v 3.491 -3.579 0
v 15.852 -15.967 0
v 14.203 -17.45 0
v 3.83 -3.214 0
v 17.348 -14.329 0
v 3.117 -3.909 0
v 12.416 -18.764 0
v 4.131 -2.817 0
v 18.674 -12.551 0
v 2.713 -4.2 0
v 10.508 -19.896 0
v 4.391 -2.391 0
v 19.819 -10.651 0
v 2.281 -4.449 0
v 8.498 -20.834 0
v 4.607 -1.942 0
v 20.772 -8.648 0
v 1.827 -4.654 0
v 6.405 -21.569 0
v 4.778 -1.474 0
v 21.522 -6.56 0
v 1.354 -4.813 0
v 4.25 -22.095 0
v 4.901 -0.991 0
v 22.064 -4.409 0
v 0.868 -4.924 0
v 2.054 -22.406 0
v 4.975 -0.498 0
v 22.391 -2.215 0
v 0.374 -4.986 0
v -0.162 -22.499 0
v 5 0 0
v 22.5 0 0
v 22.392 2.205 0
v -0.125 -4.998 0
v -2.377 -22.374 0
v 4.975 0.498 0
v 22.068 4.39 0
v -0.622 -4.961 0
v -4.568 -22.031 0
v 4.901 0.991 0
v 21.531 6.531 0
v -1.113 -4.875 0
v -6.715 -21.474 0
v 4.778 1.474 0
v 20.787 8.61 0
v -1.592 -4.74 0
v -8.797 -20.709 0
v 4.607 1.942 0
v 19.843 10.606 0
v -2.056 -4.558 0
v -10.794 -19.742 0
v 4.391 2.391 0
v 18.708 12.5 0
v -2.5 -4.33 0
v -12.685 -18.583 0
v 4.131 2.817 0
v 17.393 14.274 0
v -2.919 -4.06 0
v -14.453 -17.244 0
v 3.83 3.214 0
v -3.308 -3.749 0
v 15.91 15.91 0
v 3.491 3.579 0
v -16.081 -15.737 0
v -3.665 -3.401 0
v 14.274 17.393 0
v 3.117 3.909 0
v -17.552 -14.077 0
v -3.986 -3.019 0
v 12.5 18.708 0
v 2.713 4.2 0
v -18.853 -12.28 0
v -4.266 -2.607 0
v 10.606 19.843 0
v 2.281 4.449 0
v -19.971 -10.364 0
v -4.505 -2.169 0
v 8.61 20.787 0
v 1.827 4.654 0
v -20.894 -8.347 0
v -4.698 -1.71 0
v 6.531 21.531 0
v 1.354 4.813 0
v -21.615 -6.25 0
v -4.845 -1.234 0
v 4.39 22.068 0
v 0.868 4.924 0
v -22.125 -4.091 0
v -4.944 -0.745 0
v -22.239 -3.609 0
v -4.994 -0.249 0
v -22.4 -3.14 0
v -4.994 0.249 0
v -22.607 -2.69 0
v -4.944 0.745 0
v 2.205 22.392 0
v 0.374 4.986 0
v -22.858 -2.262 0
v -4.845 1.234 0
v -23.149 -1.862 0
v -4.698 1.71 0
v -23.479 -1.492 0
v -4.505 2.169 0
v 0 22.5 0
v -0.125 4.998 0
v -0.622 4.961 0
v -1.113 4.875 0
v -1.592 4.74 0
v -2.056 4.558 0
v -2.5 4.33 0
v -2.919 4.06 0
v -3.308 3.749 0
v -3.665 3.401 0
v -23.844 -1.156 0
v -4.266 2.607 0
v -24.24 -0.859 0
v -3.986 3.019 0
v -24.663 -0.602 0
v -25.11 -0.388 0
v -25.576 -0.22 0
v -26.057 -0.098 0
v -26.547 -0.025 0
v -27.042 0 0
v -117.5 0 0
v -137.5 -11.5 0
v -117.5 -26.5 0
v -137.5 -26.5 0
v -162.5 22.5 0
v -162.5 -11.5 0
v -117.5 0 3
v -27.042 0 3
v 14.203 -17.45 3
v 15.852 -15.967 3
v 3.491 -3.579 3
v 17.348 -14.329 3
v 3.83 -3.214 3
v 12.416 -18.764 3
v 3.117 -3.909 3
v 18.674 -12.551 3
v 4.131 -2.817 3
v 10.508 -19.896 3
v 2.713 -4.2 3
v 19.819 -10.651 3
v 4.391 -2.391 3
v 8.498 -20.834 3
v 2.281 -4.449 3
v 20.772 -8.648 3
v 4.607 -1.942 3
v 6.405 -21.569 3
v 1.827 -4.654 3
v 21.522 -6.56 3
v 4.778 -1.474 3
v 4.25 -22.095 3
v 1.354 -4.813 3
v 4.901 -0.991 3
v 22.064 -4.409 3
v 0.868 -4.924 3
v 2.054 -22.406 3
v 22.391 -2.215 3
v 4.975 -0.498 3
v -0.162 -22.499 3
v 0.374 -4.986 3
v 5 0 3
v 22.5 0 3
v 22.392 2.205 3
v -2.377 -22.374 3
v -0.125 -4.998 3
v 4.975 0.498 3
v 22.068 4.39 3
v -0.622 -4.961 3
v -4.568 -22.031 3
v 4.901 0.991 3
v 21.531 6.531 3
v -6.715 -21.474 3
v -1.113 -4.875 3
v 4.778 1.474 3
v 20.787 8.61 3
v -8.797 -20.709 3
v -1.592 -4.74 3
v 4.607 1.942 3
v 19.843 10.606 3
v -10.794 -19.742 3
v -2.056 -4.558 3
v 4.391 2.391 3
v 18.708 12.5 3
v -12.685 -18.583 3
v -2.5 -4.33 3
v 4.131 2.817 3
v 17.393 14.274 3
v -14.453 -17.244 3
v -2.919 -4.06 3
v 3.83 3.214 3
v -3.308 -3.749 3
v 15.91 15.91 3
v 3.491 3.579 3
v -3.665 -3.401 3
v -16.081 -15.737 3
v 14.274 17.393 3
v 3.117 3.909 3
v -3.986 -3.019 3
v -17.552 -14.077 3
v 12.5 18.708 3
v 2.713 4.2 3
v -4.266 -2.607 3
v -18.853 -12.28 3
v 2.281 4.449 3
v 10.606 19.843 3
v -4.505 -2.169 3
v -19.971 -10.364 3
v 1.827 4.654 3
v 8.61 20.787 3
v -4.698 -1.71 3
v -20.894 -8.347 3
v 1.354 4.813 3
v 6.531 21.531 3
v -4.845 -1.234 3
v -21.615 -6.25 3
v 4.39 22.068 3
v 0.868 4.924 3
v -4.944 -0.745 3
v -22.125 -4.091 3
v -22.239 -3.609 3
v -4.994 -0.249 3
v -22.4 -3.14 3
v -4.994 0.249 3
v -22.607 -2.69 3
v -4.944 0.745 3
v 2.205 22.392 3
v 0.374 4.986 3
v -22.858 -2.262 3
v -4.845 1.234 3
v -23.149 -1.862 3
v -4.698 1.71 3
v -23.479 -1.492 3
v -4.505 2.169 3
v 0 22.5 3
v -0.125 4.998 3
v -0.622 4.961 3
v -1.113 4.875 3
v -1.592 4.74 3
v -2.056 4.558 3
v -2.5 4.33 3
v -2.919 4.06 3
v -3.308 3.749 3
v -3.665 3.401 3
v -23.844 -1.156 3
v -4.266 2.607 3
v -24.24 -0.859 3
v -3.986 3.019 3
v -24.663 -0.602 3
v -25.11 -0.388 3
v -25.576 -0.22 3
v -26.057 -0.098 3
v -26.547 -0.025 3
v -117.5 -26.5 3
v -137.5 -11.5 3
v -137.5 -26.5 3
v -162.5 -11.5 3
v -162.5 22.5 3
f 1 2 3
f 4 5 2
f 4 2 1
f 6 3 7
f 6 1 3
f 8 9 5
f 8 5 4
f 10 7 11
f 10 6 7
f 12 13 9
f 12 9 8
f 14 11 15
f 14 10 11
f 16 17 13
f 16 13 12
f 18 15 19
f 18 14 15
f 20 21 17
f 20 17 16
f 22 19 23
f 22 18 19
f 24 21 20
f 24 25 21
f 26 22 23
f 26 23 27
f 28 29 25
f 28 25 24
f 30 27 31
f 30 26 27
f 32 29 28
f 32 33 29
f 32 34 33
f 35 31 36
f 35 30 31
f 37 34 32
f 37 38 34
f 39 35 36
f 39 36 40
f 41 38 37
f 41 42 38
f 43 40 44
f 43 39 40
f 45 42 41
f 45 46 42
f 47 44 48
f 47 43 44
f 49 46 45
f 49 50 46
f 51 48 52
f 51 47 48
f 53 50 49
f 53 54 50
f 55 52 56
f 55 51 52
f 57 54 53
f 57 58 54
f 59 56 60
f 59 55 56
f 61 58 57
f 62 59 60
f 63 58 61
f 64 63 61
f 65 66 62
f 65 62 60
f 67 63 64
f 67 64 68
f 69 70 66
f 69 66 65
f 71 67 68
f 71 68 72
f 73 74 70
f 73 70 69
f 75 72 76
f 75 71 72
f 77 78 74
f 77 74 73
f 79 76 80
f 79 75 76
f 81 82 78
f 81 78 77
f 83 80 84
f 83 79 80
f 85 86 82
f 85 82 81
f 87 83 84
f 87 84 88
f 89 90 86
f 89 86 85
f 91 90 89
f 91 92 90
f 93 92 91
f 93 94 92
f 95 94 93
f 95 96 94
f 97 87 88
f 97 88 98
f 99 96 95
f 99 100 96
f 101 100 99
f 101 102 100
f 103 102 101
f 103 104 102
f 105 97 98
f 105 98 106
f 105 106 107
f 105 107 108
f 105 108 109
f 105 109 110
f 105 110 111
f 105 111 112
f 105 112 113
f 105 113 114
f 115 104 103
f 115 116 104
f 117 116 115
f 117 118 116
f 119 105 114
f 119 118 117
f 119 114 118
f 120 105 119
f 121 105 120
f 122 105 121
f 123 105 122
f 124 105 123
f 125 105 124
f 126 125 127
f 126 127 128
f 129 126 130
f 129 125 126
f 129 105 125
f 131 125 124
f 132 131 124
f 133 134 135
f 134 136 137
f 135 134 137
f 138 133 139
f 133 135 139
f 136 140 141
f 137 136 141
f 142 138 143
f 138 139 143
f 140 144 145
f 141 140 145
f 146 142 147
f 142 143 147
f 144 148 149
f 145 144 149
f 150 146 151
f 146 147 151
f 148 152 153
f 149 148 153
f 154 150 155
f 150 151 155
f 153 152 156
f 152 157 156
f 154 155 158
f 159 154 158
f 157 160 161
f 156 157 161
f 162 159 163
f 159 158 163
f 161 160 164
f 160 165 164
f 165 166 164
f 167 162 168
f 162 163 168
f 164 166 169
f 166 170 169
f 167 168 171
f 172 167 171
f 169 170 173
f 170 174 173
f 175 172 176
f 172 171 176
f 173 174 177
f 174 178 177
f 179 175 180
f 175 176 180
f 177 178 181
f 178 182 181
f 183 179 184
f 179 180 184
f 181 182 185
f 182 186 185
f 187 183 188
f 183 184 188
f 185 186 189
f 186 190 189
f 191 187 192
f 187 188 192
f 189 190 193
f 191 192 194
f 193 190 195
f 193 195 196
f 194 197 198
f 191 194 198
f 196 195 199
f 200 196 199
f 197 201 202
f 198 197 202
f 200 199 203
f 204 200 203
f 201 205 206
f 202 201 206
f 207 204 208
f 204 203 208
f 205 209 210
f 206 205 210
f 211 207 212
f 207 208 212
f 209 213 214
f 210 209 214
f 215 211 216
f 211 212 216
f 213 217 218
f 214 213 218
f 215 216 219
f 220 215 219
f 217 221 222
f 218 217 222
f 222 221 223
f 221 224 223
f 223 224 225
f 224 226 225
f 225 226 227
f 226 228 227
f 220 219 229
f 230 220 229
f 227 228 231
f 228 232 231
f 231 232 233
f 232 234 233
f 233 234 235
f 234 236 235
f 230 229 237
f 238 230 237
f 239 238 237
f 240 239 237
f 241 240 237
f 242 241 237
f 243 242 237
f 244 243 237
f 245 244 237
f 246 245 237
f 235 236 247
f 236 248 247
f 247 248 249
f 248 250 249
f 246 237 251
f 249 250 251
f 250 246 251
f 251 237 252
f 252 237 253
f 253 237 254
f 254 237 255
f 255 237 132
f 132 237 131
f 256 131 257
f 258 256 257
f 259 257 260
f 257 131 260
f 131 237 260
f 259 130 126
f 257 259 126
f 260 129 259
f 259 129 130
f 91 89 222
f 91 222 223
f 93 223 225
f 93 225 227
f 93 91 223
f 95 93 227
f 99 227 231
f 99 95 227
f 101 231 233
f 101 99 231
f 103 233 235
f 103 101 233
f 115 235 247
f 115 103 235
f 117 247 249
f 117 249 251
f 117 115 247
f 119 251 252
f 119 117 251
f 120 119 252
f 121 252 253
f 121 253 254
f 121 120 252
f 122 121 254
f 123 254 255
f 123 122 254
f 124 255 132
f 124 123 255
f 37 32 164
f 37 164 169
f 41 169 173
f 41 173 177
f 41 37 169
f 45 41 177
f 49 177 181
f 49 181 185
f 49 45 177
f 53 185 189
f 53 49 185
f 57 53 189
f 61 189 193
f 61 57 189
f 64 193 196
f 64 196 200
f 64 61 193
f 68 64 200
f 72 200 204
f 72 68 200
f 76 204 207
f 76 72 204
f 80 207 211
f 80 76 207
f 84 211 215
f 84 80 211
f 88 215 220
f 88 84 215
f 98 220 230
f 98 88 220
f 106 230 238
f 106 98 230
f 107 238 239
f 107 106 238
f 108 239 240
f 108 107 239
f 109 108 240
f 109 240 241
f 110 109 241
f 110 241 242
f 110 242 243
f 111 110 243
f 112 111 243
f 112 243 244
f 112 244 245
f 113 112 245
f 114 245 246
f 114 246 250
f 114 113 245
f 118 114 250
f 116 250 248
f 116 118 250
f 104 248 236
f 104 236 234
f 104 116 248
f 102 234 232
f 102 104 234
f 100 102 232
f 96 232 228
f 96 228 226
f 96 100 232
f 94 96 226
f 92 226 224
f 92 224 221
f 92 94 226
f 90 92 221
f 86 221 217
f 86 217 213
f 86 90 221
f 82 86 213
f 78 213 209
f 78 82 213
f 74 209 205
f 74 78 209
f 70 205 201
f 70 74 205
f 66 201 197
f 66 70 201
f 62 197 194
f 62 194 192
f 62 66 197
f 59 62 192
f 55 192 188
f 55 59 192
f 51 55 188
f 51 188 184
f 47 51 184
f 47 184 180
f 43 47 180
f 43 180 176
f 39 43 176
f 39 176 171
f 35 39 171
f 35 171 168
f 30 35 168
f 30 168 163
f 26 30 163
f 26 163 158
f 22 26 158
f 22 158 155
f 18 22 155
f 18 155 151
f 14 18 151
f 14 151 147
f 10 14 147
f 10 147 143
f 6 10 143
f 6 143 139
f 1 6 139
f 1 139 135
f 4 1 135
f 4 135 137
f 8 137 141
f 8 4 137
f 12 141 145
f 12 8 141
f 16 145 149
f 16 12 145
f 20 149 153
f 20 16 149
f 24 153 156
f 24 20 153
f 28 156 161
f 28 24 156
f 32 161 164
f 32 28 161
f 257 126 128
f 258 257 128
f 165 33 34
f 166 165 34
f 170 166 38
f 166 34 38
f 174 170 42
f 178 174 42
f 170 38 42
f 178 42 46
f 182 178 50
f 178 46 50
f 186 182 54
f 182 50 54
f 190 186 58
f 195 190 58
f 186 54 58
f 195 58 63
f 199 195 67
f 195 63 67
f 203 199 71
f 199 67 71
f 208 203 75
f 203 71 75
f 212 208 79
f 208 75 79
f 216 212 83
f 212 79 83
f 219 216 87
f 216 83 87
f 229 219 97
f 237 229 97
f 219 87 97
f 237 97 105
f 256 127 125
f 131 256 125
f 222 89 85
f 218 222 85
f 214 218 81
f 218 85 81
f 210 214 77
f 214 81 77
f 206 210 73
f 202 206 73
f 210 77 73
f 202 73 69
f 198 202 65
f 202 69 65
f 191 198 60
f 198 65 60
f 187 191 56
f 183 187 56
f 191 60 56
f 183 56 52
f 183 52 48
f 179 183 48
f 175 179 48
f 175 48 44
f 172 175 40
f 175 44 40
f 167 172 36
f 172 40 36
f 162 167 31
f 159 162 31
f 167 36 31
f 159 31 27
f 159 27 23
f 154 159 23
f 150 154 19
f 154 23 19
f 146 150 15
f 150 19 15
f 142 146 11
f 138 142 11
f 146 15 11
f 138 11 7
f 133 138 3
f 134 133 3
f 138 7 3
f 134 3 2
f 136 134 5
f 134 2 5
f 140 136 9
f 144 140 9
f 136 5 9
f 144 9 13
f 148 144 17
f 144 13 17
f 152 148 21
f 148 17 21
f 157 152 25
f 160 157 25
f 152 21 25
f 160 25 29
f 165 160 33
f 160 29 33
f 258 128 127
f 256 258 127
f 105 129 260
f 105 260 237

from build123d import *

# Parameters (mm, degrees)
SKETCH1_R           = 2.5
BOSS_EXTRUDE1_DEPTH = 3
BOSS_EXTRUDE2_START = -3
SKETCH3_R           = 22.5
SKETCH3_R_2         = 5
BOSS_EXTRUDE2_DEPTH = 3


with BuildPart() as part:
    # Sketch1 → Boss-Extrude1 (new body)
    # profile 1 of 8: a face of its own
    with BuildSketch(Plane.XY):
        with BuildLine():
            ThreePointArc((22.5, 0), (15.909902577, 15.909902577), (0, 22.5))
            Line((0, 22.5), (-22.5, 0))
            Line((-22.5, 0), (-22.124973736, -4.090909091))
            ThreePointArc((-22.124973736, -4.090909091), (2.054031517, -22.406047276), (22.5, 0))
        make_face()
        with BuildLine():
            ThreePointArc((-7.5, 5), (-9.267766953, 9.267766953), (-5, 7.5))
            Line((-5, 7.5), (-5, 9))
            Line((-5, 9), (-2.405779746, 18.179870439))
            ThreePointArc((-2.405779746, 18.179870439), (0, 20), (2.405779746, 18.179870439))
            Line((2.405779746, 18.179870439), (5, 9))
            Line((5, 9), (5, 7.5))
            ThreePointArc((5, 7.5), (7.5, 10), (10, 7.5))
            ThreePointArc((10, 7.5), (9.267766953, 5.732233047), (7.5, 5))
            Line((7.5, 5), (9, 5))
            Line((9, 5), (18.179870439, 2.405779746))
            ThreePointArc((18.179870439, 2.405779746), (19.493699588, 1.508363998), (20, 0))
            ThreePointArc((20, 0), (19.493699588, -1.508363998), (18.179870439, -2.405779746))
            Line((18.179870439, -2.405779746), (9, -5))
            Line((9, -5), (7.5, -5))
            ThreePointArc((7.5, -5), (9.267766953, -5.732233047), (10, -7.5))
            ThreePointArc((10, -7.5), (7.5, -10), (5, -7.5))
            Line((5, -7.5), (5, -9))
            Line((5, -9), (2.405779746, -18.179870439))
            ThreePointArc((2.405779746, -18.179870439), (0, -20), (-2.405779746, -18.179870439))
            Line((-2.405779746, -18.179870439), (-5, -9))
            Line((-5, -9), (-5, -7.5))
            ThreePointArc((-5, -7.5), (-9.267766953, -9.267766953), (-7.5, -5))
            Line((-7.5, -5), (-9, -5))
            Line((-9, -5), (-18.179870439, -2.405779746))
            ThreePointArc((-18.179870439, -2.405779746), (-20, 0), (-18.179870439, 2.405779746))
            Line((-18.179870439, 2.405779746), (-9, 5))
            Line((-9, 5), (-7.5, 5))
        make_face(mode=Mode.SUBTRACT)
    # profile 2 of 8: a face of its own
    with BuildSketch(Plane.XY):
        with Locations((-7.5, 7.5)):
            Circle(SKETCH1_R)
    # profile 3 of 8: a face of its own
    with BuildSketch(Plane.XY):
        with Locations((7.5, 7.5)):
            Circle(SKETCH1_R)
    # profile 4 of 8: a face of its own
    with BuildSketch(Plane.XY):
        with Locations((7.5, -7.5)):
            Circle(SKETCH1_R)
    # profile 5 of 8: a face of its own
    with BuildSketch(Plane.XY):
        with Locations((-7.5, -7.5)):
            Circle(SKETCH1_R)
    # profile 6 of 8: a face of its own
    with BuildSketch(Plane.XY):
        Polygon((-22.5, 22.5), (0, 22.5), (-22.5, 0), align=None)
    # profile 7 of 8: a face of its own
    with BuildSketch(Plane.XY):
        Polygon((-22.5, 0), (-22.5, 22.5), (-162.5, 22.5), (-162.5, -11.5), (-137.5, -11.5), (-137.5, -26.5), (-117.5, -26.5), (-117.5, 0), align=None)
    # profile 8 of 8: a face of its own
    with BuildSketch(Plane.XY):
        with BuildLine():
            Line((-22.5, 0), (-22.124973736, -4.090909091))
            ThreePointArc((-22.124973736, -4.090909091), (-23.843623821, -1.156469426), (-27.041634566, 0))
            Line((-27.041634566, 0), (-22.5, 0))
        make_face()
    extrude(amount=BOSS_EXTRUDE1_DEPTH)

    # Sketch3 → Boss-Extrude2 (add)
    with BuildSketch(Plane.XY.offset(3).offset(BOSS_EXTRUDE2_START)):
        Circle(SKETCH3_R)
        Circle(SKETCH3_R_2, mode=Mode.SUBTRACT)
    extrude(amount=BOSS_EXTRUDE2_DEPTH)


solid = part.part
